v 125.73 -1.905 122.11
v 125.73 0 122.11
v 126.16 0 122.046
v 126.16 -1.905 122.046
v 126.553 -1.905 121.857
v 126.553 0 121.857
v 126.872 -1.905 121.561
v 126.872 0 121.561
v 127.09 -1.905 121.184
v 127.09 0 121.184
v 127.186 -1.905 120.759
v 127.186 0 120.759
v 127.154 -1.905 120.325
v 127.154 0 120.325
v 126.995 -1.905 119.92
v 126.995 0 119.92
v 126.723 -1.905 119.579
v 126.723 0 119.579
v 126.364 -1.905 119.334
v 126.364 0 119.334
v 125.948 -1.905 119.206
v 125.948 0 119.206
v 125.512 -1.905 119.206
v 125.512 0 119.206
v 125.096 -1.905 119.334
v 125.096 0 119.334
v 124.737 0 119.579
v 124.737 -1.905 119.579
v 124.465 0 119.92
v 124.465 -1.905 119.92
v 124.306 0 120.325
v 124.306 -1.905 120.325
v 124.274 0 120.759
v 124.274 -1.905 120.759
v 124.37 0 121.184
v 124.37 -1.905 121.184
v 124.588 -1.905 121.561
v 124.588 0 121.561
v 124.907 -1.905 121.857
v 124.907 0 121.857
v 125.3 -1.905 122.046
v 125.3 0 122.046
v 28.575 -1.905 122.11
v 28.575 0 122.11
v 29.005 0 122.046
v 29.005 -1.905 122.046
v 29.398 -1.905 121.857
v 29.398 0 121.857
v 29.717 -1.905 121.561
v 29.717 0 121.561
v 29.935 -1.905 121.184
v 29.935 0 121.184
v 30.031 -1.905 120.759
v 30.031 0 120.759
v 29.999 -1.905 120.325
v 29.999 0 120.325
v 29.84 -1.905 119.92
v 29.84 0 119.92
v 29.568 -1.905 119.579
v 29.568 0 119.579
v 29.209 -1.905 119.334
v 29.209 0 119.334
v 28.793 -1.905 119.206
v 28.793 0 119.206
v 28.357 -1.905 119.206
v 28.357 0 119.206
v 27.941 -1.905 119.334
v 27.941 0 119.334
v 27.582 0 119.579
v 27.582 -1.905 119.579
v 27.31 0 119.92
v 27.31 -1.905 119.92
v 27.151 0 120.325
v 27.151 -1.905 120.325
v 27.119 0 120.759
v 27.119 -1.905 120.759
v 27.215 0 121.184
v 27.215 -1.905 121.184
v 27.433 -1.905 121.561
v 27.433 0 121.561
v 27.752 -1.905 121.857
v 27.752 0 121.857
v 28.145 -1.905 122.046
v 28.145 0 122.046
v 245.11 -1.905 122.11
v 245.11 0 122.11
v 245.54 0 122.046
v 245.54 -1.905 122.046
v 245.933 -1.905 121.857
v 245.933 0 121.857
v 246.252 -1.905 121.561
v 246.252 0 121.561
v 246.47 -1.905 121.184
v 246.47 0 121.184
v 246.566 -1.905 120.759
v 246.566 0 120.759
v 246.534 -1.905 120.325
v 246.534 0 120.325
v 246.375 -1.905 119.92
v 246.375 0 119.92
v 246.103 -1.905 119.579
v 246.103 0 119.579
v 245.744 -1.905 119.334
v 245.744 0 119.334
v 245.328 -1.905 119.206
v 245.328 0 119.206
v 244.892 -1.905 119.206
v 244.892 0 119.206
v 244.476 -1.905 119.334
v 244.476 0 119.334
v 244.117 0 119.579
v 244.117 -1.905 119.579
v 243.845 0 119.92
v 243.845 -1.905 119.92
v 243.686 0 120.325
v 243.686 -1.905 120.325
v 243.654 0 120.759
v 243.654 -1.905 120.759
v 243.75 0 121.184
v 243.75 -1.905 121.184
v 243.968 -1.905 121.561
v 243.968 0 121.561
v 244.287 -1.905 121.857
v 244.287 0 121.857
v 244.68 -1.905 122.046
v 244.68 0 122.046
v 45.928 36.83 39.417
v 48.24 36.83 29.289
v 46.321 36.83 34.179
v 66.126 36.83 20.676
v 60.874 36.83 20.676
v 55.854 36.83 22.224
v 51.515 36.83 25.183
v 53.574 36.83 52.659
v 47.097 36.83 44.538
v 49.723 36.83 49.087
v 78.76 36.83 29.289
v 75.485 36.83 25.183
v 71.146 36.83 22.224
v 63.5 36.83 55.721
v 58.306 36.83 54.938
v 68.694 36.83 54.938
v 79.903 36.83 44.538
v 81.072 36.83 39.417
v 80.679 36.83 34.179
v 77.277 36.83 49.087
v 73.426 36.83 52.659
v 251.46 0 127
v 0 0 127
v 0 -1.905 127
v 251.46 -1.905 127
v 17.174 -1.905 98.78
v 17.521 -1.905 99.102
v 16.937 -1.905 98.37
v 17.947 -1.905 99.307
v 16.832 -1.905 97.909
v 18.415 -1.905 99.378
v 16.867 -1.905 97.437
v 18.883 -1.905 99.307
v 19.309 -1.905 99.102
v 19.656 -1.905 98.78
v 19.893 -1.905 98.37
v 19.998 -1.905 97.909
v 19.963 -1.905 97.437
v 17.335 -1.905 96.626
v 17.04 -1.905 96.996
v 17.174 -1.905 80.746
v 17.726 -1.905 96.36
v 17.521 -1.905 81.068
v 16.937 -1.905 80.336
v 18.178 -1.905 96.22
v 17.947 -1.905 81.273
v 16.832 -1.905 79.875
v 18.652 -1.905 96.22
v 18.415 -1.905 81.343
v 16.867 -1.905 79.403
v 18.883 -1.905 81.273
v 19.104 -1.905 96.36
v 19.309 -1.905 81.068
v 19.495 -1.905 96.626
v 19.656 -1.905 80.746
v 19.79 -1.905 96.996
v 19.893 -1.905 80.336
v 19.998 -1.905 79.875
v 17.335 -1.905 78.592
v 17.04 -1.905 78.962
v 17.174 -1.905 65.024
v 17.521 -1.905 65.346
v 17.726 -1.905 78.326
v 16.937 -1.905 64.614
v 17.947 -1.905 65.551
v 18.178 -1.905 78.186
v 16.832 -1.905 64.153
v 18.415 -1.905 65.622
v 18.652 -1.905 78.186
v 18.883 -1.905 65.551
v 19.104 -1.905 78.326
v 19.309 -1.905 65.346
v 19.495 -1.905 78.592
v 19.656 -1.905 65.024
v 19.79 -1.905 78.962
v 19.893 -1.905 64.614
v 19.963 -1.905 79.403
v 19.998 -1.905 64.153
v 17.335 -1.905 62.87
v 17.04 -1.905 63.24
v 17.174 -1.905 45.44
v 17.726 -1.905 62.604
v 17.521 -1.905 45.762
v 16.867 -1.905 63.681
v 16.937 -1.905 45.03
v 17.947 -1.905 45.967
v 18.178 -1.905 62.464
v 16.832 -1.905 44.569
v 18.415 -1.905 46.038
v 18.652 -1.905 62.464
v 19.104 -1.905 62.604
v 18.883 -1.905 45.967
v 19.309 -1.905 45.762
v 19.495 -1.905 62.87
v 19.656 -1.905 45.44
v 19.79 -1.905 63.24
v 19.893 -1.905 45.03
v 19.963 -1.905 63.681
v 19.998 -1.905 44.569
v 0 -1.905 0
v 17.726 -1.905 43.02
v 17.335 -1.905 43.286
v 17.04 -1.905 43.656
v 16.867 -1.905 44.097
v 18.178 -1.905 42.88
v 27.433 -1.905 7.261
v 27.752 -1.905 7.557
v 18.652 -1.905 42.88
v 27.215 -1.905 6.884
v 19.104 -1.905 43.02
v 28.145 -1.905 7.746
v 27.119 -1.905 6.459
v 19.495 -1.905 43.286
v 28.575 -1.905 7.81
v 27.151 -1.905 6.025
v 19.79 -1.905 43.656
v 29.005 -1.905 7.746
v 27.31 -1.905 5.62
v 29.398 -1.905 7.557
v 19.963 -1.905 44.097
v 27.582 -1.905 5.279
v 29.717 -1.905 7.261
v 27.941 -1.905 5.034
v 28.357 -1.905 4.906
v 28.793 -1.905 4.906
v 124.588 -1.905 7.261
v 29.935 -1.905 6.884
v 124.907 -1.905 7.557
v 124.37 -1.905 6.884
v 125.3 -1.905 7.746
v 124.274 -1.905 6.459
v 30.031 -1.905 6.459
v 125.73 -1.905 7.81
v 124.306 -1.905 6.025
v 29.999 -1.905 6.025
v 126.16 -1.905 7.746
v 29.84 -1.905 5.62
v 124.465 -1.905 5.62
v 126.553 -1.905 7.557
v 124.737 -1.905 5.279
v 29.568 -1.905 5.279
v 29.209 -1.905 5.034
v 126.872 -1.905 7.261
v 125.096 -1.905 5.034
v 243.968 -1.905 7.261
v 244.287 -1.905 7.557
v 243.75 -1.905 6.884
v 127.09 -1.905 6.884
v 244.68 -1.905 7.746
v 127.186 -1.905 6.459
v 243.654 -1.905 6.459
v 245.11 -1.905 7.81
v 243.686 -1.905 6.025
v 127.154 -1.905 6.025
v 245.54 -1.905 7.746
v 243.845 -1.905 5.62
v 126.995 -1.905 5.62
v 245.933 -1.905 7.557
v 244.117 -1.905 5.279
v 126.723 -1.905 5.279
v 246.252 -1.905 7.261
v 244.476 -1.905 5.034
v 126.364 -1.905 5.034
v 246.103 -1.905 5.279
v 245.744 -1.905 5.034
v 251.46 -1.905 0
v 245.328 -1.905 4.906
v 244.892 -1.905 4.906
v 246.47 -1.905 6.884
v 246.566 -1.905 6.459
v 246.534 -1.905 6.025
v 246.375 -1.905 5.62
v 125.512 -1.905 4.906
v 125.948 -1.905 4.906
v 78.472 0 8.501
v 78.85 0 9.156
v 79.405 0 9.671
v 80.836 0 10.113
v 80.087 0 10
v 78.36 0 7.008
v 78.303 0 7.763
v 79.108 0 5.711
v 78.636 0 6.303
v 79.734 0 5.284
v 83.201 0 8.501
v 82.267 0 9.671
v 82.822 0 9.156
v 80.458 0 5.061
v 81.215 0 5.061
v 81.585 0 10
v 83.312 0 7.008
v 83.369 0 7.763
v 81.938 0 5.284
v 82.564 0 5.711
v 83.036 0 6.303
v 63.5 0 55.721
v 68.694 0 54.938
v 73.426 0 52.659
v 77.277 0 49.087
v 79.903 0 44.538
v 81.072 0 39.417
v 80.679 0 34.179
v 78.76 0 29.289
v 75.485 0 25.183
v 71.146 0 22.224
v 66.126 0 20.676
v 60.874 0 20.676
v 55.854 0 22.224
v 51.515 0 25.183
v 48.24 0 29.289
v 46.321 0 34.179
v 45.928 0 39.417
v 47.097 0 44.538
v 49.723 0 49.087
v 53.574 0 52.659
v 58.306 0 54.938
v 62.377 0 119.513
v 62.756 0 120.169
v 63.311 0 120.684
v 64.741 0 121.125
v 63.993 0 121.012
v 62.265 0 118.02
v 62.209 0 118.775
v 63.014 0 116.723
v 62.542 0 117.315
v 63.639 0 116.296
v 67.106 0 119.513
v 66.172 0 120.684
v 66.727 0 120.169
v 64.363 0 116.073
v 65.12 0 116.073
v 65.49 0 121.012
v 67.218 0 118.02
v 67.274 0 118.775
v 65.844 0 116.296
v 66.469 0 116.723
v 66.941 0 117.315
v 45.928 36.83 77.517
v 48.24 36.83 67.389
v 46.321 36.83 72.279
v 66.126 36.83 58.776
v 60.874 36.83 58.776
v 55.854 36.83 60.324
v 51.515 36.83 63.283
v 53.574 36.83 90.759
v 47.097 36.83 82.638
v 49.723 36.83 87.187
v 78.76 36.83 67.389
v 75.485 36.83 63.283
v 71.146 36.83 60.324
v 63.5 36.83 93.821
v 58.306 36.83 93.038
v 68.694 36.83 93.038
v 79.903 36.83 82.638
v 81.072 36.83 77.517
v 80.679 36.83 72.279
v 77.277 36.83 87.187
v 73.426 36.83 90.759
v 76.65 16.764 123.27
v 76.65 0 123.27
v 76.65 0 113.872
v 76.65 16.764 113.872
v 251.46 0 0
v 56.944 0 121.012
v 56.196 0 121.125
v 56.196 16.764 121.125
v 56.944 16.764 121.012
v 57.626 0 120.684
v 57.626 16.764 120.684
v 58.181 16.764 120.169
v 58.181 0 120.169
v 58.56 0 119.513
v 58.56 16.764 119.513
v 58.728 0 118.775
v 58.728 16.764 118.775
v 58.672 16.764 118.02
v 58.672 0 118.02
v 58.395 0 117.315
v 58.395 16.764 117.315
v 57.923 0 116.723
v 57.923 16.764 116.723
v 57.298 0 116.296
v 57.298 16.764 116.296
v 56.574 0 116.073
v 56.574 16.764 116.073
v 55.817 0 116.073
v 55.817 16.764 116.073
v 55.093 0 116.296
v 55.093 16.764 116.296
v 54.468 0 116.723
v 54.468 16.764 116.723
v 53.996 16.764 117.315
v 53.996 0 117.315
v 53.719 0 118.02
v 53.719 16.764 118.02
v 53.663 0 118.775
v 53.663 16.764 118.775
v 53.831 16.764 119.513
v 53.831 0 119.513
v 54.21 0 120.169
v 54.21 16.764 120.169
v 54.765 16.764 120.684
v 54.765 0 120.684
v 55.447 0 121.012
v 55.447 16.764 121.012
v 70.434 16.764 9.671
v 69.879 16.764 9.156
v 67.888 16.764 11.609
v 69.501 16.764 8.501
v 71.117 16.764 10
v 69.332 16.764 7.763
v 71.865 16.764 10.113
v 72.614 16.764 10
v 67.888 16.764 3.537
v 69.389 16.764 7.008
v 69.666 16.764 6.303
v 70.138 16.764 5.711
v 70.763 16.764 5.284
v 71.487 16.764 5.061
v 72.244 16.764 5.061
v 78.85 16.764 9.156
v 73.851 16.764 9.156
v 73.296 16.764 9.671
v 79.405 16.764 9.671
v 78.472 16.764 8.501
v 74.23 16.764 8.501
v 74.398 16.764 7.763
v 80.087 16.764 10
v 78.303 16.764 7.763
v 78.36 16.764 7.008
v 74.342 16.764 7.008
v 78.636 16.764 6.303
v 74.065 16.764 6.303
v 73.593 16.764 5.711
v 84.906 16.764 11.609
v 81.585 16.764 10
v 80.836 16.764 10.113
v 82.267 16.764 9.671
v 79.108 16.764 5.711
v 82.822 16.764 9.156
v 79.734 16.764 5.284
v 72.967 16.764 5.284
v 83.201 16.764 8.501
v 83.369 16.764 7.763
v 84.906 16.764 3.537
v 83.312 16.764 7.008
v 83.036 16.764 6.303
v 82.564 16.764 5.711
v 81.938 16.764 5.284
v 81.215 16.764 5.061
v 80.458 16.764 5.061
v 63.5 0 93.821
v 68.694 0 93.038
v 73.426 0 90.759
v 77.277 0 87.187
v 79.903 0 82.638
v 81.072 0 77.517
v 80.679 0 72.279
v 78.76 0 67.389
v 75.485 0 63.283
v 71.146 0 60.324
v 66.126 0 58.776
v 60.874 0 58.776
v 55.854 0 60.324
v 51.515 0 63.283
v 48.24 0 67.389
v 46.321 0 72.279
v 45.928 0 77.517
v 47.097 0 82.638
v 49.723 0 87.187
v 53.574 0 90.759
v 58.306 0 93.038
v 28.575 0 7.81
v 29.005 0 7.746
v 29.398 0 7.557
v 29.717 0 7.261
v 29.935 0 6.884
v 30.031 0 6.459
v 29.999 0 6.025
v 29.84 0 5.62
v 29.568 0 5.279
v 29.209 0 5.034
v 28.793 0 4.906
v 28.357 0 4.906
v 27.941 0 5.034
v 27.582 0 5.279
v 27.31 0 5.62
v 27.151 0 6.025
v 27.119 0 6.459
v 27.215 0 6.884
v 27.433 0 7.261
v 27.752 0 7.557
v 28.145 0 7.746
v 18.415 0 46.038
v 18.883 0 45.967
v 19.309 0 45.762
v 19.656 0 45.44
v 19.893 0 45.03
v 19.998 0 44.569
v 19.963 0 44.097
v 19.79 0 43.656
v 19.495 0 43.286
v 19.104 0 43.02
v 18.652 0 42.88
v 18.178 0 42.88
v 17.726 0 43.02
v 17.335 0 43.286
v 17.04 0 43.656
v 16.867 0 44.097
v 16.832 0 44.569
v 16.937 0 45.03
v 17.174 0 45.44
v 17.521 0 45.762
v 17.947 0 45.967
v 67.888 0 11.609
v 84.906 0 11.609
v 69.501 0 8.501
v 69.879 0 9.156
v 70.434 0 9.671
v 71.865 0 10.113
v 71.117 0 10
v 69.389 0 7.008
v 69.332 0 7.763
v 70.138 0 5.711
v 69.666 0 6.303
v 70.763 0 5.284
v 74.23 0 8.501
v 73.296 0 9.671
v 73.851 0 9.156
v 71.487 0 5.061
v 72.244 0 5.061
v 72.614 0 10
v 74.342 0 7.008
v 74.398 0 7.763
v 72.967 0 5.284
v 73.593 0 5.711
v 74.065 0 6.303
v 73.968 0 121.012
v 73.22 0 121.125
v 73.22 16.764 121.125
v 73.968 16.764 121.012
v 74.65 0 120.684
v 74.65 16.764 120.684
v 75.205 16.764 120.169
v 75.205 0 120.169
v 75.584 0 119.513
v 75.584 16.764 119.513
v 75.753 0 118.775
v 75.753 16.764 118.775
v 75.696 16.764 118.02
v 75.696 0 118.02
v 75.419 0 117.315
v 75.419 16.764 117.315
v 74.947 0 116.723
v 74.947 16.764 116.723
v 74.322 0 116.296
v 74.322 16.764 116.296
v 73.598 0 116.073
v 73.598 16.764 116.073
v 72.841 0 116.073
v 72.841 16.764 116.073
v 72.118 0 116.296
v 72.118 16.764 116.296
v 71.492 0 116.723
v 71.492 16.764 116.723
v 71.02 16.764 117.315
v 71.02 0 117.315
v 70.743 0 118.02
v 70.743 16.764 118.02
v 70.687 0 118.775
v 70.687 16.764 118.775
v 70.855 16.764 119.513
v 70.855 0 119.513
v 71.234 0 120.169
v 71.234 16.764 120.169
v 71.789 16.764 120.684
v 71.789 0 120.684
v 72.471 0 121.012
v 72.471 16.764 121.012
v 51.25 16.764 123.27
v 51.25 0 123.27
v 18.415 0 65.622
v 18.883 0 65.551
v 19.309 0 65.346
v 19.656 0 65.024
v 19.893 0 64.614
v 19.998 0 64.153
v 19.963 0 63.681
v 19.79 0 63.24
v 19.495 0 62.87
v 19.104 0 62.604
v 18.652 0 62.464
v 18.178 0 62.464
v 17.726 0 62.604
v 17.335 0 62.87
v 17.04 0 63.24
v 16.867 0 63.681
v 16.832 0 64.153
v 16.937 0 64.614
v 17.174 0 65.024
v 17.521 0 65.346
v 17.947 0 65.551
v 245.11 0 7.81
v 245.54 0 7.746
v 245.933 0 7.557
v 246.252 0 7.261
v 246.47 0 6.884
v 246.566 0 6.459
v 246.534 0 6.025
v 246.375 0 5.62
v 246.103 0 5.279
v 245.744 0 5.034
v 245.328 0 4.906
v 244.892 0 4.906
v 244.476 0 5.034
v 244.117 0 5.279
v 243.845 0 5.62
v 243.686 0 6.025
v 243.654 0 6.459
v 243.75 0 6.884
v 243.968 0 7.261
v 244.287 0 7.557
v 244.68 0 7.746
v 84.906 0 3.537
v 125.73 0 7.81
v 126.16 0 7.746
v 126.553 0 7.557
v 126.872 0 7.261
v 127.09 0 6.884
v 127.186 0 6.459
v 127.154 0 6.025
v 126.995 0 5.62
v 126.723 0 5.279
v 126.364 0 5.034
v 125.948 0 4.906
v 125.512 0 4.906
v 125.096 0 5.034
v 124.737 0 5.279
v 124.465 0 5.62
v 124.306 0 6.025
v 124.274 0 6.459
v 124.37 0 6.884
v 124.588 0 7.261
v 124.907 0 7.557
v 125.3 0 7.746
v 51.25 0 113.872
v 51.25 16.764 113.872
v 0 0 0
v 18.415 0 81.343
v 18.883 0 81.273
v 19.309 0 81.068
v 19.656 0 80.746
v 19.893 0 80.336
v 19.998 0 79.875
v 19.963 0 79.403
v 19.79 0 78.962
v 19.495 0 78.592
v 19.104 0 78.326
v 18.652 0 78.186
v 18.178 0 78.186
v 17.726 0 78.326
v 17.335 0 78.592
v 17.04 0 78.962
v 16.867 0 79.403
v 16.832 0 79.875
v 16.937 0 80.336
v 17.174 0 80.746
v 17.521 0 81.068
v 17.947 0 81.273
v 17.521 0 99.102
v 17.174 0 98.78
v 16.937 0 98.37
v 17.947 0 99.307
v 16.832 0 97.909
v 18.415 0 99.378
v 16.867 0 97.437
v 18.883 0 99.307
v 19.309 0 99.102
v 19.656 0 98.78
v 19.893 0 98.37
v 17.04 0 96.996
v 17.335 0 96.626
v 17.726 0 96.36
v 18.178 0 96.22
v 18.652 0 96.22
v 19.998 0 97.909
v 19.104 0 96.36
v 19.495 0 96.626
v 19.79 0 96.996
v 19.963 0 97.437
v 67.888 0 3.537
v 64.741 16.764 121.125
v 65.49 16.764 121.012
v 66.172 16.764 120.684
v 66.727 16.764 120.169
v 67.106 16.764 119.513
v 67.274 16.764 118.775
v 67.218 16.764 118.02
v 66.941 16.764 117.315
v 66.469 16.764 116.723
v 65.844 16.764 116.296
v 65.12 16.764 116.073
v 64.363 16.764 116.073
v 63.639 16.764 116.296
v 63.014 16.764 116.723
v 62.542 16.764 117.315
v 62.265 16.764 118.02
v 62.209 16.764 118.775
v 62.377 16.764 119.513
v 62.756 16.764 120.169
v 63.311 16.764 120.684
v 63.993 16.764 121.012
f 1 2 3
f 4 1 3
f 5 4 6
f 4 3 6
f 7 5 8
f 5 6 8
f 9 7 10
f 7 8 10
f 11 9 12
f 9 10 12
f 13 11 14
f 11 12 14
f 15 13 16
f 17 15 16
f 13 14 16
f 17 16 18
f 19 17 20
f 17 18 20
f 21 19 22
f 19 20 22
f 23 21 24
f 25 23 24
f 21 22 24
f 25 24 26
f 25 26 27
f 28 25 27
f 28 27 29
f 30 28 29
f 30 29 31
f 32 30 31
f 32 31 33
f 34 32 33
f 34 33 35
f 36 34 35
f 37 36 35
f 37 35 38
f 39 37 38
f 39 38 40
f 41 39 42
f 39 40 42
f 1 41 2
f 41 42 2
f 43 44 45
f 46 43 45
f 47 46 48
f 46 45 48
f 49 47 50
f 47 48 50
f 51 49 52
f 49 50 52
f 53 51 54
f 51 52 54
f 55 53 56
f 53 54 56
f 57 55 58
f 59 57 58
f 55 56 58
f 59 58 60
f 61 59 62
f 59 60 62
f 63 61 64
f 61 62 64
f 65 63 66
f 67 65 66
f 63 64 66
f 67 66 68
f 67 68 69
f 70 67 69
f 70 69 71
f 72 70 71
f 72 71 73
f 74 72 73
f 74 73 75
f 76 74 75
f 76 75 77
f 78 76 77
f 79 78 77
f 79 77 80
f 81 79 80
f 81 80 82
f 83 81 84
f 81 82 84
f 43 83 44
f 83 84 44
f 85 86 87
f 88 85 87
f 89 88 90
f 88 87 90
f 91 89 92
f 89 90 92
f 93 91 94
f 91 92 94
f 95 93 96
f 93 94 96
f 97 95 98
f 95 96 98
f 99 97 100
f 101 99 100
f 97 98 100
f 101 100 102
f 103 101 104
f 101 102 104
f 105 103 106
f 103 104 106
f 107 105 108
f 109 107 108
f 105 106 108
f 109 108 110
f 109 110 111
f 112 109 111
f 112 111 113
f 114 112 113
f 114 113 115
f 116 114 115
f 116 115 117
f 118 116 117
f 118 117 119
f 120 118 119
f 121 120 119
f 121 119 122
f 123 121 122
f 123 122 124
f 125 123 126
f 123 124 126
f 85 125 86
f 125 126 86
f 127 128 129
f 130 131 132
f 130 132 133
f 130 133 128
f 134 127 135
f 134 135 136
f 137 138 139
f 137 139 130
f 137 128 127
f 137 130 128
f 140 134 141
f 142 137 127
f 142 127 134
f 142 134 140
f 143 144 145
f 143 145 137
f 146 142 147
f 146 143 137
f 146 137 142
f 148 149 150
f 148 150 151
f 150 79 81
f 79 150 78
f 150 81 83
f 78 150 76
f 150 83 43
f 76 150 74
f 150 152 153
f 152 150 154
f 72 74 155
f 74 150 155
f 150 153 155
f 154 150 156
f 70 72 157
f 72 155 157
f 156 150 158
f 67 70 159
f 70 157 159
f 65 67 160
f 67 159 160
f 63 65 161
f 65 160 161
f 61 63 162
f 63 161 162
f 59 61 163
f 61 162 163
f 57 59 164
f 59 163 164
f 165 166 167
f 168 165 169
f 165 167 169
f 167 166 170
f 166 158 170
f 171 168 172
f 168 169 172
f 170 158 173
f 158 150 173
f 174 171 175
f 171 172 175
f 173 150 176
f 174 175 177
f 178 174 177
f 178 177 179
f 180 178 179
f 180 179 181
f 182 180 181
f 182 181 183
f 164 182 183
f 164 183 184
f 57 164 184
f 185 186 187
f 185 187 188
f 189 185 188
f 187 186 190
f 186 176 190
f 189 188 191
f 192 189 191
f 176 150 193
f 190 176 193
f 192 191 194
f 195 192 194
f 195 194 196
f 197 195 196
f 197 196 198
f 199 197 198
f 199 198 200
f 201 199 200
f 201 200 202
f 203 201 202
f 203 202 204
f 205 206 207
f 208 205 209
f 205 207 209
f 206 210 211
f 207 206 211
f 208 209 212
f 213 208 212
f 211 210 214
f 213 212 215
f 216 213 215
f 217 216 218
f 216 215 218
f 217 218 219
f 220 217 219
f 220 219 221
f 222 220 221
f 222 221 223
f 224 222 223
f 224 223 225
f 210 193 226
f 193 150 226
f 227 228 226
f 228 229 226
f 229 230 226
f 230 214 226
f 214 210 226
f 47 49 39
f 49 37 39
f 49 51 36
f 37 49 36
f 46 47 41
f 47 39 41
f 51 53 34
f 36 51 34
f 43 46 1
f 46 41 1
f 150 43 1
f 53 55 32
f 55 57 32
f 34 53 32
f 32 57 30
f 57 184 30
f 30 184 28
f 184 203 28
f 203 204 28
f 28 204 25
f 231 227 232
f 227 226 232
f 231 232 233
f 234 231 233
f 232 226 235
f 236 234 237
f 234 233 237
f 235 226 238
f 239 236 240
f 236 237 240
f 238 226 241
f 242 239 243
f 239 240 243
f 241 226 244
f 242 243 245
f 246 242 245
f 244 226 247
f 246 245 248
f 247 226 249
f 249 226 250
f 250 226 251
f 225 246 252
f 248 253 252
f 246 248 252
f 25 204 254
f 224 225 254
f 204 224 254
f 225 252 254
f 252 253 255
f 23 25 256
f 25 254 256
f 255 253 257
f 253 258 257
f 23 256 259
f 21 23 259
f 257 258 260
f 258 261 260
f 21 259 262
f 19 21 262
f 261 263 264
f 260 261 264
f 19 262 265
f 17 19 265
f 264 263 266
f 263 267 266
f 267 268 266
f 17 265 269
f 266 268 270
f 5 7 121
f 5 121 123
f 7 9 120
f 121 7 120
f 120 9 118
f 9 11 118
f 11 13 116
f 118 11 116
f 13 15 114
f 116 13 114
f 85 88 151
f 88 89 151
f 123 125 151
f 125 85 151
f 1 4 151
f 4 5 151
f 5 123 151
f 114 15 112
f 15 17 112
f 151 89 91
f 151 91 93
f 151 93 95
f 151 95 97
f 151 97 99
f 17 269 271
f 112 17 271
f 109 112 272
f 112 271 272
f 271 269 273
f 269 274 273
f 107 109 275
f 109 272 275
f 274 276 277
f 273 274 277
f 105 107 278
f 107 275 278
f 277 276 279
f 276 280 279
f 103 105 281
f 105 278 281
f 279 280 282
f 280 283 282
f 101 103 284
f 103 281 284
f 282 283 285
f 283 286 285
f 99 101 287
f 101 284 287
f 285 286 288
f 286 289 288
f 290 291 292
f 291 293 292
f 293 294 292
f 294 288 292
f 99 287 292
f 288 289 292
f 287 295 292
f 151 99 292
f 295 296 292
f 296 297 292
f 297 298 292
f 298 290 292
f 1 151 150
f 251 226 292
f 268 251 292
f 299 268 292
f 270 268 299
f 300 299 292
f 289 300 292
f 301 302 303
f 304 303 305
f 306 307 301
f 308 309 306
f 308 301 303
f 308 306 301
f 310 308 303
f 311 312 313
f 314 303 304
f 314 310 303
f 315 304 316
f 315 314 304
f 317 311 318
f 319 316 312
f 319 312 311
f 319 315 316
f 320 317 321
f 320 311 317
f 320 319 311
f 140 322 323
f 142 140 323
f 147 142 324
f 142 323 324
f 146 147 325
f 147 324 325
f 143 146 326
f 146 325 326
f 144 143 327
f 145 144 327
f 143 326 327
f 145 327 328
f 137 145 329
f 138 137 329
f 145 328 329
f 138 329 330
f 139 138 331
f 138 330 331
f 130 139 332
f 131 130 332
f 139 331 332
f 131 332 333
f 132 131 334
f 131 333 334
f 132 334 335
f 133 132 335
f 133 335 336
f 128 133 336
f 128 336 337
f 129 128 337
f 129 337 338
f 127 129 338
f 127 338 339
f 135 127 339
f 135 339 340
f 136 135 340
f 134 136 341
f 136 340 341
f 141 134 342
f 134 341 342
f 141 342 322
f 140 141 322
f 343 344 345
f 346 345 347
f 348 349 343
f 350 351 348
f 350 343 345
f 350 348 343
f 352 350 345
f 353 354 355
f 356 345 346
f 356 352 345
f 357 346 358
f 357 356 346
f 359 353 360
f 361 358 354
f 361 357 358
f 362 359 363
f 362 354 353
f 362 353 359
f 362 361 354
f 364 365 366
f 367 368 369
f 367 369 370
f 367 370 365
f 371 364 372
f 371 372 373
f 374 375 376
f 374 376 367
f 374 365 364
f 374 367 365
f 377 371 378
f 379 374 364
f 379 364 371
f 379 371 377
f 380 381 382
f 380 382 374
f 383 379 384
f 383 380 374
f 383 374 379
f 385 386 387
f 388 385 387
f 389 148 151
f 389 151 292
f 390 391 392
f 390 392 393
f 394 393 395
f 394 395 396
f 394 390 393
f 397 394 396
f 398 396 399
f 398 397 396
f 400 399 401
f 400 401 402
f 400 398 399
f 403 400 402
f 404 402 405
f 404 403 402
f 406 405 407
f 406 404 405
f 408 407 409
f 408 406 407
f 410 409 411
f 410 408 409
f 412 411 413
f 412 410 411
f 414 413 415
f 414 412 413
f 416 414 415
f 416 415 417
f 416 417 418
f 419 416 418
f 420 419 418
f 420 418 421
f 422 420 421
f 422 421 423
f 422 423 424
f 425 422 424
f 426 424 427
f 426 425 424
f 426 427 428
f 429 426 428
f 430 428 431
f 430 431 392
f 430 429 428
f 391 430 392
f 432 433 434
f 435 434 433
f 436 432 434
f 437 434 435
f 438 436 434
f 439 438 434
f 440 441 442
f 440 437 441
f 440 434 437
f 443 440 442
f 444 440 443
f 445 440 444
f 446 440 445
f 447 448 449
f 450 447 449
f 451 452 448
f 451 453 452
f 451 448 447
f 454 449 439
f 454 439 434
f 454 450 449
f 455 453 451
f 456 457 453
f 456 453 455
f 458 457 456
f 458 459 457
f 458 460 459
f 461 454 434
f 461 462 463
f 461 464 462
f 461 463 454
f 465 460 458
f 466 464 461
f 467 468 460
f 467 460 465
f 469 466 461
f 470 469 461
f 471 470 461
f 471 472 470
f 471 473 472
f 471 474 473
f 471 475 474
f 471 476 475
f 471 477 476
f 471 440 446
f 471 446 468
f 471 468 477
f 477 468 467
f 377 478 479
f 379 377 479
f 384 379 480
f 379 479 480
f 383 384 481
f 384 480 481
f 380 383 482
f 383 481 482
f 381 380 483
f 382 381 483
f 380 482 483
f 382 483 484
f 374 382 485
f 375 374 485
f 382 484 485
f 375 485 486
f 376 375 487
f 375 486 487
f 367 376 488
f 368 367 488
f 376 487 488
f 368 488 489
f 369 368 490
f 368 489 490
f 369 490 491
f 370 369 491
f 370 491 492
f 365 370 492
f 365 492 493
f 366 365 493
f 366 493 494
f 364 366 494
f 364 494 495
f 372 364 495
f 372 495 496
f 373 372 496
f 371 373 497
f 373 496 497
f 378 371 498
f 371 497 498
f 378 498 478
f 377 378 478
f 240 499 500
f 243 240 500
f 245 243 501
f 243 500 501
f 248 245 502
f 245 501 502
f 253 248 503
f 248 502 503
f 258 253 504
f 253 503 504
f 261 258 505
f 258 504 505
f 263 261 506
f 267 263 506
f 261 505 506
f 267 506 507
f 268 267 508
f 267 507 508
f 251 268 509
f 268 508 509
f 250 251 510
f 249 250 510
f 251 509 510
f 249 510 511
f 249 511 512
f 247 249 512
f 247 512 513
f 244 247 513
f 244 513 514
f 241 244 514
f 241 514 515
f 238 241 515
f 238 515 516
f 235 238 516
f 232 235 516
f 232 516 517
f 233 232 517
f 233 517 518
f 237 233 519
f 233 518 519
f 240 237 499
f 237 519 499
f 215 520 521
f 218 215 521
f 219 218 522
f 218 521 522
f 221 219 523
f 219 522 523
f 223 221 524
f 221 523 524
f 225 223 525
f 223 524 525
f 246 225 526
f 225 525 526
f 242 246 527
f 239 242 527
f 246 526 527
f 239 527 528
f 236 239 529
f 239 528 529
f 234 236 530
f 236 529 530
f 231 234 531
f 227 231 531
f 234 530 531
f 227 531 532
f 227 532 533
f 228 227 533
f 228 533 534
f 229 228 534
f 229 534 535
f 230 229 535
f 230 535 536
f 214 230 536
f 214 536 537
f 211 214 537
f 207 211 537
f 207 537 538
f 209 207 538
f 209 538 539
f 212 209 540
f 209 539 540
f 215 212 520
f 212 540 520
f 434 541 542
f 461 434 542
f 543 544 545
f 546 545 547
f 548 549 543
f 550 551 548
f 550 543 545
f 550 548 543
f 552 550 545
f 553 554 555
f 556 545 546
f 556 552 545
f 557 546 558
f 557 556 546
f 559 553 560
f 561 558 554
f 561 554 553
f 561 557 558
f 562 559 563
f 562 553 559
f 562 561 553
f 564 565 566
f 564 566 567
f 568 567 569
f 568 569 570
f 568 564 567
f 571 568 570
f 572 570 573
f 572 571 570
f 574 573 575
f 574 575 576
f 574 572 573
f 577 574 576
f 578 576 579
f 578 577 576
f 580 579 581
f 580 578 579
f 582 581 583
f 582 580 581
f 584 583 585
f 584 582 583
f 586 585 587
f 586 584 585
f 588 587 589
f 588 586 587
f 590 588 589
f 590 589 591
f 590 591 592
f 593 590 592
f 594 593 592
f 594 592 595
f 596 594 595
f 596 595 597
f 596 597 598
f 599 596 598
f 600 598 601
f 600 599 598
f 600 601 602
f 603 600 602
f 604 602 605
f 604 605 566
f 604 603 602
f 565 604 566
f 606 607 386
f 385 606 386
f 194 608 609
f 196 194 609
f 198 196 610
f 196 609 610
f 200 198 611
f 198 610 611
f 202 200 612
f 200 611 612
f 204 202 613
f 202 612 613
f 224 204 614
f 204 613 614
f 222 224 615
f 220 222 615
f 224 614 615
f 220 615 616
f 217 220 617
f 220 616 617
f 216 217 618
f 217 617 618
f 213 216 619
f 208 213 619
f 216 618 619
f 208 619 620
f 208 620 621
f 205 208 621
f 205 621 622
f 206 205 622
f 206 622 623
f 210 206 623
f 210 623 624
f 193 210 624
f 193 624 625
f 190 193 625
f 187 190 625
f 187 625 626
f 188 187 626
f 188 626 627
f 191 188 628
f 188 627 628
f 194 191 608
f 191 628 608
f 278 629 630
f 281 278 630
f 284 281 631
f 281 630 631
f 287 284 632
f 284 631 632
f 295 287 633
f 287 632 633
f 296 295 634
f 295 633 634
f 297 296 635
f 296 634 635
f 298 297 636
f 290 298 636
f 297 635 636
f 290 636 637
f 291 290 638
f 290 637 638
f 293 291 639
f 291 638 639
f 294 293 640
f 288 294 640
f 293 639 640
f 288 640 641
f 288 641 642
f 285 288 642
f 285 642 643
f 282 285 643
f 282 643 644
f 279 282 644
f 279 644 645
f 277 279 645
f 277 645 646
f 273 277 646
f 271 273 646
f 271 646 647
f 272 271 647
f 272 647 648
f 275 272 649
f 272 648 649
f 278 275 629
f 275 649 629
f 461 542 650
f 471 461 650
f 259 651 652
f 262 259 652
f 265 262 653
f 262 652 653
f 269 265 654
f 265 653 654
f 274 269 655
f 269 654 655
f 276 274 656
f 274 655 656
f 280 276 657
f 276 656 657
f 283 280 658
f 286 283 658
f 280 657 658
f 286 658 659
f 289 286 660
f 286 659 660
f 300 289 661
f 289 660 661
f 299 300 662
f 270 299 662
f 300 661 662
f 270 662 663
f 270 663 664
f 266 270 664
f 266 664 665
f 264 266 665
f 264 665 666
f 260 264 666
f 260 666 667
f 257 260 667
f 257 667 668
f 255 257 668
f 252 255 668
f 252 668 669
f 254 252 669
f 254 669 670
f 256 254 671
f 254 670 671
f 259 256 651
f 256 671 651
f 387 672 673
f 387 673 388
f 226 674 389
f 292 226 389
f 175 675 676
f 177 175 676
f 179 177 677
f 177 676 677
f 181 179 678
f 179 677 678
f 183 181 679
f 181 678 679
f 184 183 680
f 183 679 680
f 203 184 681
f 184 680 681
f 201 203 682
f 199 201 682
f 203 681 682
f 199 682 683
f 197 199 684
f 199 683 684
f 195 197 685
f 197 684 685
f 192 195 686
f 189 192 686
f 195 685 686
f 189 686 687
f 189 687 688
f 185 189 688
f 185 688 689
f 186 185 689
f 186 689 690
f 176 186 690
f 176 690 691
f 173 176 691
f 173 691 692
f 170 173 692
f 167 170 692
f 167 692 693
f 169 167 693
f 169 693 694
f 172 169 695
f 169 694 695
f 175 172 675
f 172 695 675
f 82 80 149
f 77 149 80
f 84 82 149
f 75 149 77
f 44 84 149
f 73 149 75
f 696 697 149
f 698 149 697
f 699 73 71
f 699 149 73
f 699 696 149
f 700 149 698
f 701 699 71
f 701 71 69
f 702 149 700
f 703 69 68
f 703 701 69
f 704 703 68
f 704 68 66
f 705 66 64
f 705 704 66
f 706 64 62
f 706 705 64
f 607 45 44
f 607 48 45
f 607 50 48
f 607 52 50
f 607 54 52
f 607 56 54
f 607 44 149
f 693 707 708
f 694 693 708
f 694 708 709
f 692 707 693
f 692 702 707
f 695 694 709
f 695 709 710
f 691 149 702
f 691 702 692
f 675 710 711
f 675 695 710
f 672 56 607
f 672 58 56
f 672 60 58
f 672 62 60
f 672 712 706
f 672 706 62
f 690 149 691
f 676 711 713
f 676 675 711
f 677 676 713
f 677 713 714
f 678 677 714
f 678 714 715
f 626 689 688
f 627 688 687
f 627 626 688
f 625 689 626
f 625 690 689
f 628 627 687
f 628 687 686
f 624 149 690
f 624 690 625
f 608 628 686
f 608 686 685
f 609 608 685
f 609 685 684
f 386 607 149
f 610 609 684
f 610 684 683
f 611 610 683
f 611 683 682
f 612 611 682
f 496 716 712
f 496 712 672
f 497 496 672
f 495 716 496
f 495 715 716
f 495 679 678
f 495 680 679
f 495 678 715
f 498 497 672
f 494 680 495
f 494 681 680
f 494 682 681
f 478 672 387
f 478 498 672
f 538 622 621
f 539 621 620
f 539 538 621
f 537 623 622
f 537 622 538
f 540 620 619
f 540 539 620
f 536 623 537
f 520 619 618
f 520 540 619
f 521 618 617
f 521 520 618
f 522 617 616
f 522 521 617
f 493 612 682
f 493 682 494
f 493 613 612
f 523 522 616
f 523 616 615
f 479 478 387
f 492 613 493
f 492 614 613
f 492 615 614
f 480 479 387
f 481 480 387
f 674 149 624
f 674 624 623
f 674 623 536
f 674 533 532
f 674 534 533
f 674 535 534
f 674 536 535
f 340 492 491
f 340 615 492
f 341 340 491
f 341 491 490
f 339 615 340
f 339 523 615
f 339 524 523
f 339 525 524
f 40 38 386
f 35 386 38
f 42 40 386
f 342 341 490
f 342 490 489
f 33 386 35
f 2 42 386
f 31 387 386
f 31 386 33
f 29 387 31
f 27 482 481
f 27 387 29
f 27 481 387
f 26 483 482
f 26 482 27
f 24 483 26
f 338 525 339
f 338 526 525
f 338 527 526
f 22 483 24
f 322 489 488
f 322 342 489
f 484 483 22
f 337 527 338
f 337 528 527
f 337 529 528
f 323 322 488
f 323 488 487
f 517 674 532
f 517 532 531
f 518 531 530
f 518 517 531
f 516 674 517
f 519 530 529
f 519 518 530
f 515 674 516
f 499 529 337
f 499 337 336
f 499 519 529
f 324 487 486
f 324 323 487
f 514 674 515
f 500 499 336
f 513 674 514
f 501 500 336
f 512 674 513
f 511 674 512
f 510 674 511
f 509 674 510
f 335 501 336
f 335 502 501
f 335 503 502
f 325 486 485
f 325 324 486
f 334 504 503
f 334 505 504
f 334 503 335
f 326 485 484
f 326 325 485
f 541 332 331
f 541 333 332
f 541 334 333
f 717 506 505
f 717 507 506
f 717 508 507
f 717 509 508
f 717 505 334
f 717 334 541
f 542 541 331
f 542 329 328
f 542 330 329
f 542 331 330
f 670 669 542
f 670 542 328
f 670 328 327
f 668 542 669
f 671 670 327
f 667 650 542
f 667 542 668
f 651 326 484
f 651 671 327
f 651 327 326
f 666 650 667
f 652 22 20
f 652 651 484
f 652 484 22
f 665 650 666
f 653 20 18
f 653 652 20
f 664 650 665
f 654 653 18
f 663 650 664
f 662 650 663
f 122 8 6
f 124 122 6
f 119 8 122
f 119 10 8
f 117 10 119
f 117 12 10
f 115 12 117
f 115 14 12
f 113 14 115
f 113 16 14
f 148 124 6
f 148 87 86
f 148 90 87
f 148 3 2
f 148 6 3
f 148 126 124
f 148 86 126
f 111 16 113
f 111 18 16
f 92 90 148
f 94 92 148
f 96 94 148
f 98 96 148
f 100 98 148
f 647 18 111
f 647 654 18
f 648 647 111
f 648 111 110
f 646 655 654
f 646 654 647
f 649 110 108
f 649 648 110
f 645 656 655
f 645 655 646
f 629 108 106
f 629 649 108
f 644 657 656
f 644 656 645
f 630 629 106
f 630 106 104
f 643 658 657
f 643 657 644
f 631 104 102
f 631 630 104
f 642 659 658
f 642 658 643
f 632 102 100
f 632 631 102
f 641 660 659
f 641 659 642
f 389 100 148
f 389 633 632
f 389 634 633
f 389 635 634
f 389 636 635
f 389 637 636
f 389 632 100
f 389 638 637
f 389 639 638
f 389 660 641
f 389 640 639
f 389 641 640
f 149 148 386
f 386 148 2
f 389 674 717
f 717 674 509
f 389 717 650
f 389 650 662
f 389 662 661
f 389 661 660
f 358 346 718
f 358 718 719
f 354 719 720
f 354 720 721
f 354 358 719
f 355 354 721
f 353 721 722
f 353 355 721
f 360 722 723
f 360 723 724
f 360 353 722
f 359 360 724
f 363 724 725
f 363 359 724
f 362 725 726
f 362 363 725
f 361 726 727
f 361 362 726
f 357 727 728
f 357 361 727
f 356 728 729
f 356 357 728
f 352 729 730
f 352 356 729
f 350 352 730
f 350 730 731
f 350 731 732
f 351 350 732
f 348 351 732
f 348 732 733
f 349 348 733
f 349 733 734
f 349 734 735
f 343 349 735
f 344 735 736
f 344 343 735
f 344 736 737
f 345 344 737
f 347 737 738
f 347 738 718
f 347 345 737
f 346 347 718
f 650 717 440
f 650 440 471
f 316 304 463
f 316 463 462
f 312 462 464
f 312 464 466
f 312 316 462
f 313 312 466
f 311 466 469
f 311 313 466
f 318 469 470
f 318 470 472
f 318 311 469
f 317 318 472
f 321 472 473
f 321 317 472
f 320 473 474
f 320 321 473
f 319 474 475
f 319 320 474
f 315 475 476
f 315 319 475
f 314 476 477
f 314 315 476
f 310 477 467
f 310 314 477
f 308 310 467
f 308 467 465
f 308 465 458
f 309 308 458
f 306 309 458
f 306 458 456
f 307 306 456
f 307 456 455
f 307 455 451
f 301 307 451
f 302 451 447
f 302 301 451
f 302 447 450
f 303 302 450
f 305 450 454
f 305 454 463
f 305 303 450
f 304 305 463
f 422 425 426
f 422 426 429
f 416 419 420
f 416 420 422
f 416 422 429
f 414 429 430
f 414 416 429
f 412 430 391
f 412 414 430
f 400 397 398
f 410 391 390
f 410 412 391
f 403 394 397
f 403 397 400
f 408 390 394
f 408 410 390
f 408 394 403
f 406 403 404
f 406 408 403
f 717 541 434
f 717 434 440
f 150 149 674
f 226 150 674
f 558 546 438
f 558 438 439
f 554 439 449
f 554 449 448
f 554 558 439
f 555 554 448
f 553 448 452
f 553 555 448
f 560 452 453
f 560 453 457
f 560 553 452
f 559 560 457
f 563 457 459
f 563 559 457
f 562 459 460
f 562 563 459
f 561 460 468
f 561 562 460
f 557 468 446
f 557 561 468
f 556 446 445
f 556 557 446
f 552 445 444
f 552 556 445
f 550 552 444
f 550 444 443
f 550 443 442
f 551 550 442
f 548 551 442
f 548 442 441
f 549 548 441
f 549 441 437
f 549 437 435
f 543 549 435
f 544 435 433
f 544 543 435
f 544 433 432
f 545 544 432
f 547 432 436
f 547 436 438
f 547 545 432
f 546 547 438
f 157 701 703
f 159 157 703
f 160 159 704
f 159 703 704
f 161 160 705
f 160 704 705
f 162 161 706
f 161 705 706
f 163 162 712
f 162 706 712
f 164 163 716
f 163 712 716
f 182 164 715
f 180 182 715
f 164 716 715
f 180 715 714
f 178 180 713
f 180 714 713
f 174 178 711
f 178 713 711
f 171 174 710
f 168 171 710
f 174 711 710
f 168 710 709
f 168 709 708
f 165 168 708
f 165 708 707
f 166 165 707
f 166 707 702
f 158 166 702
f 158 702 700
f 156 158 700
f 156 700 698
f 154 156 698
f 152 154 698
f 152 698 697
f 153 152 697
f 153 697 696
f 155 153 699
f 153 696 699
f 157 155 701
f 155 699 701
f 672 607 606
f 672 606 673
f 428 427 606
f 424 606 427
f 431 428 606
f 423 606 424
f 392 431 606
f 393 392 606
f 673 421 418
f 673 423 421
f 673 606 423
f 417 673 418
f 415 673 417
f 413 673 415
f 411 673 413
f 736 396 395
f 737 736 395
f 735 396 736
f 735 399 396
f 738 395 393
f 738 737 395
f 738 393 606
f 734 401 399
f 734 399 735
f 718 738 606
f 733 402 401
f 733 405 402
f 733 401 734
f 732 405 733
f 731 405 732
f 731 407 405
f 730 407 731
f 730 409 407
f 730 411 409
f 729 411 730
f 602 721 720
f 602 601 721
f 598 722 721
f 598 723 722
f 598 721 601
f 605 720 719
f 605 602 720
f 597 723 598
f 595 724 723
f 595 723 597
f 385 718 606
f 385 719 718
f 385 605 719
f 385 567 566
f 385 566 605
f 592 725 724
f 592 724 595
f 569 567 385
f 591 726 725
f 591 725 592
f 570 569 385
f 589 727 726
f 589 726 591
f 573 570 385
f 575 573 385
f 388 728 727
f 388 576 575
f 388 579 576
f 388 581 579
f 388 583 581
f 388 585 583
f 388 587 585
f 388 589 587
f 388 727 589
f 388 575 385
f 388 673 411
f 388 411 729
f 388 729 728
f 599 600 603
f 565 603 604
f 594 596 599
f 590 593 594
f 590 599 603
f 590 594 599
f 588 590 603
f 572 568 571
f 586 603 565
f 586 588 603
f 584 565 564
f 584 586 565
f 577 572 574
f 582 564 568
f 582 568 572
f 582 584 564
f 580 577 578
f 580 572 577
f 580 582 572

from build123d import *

# Parameters (mm, degrees)
SKETCH1_W      = 251.46
SKETCH1_H      = 127
SKETCH1_R      = 1.4605
SKETCH1_R_2    = 1.5875
EXTRUDE1_DEPTH = 1.905
SKETCH2_R      = 17.62125
EXTRUDE2_DEPTH = 36.83
SKETCH3_W      = 25.4
SKETCH3_H      = 9.398
SKETCH3_R      = 2.54
SKETCH3_W_2    = 17.018
SKETCH3_H_2    = 8.0717042
EXTRUDE3_DEPTH = 16.764


with BuildPart() as part:
    # Sketch1 → Extrude1 (new body)
    with BuildSketch(Plane(origin=(0, 0, 0), x_dir=(1, 0, 0), z_dir=(0, 1, 0))):
        with Locations((125.73, -63.5)):
            Rectangle(SKETCH1_W, SKETCH1_H)
        with Locations(Location((28.575, -120.65, 0), (0, 0, 270))):
            Circle(SKETCH1_R, mode=Mode.SUBTRACT)
        with Locations(Location((28.575, -6.35, 0), (0, 0, 270))):
            Circle(SKETCH1_R, mode=Mode.SUBTRACT)
        with Locations(Location((245.11, -6.35, 0), (0, 0, 270))):
            Circle(SKETCH1_R, mode=Mode.SUBTRACT)
        with Locations(Location((245.11, -120.65, 0), (0, 0, 270))):
            Circle(SKETCH1_R, mode=Mode.SUBTRACT)
        with Locations(Location((125.73, -6.35, 0), (0, 0, 270))):
            Circle(SKETCH1_R, mode=Mode.SUBTRACT)
        with Locations(Location((125.73, -120.65, 0), (0, 0, 270))):
            Circle(SKETCH1_R, mode=Mode.SUBTRACT)
        with Locations(Location((18.415, -44.45, 0), (0, 0, 270))):
            Circle(SKETCH1_R_2, mode=Mode.SUBTRACT)
        with Locations(Location((18.415, -79.755956549, 0), (0, 0, 270))):
            Circle(SKETCH1_R_2, mode=Mode.SUBTRACT)
        with Locations(Location((18.415, -64.034066138, 0), (0, 0, 270))):
            Circle(SKETCH1_R_2, mode=Mode.SUBTRACT)
        with Locations(Location((18.415, -97.79, 0), (0, 0, 270))):
            Circle(SKETCH1_R_2, mode=Mode.SUBTRACT)
    extrude(amount=-EXTRUDE1_DEPTH)

    # Sketch2 → Extrude2 (add)
    with BuildSketch(Plane(origin=(0, 0, 0), x_dir=(1, 0, 0), z_dir=(0, 1, 0))):
        with Locations(Location((63.5, -76.2, 0), (0, 0, 270))):
            Circle(SKETCH2_R)
        with Locations(Location((63.5, -38.1, 0), (0, 0, 270))):
            Circle(SKETCH2_R)
    extrude(amount=EXTRUDE2_DEPTH)

    # Sketch3 → Extrude3 (add)
    # profile 1 of 2: a face of its own
    with BuildSketch(Plane(origin=(0, 0, 0), x_dir=(1, 0, 0), z_dir=(0, 1, 0))):
        with Locations((63.950056038, -118.57149124)):
            Rectangle(SKETCH3_W, SKETCH3_H)
        with Locations(Location((56.195547634, -118.584869875, 0), (0, 0, 270))):
            Circle(SKETCH3_R, mode=Mode.SUBTRACT)
        with Locations(Location((64.741474732, -118.584869875, 0), (0, 0, 270))):
            Circle(SKETCH3_R, mode=Mode.SUBTRACT)
        with Locations(Location((73.219619493, -118.584869875, 0), (0, 0, 270))):
            Circle(SKETCH3_R, mode=Mode.SUBTRACT)
    # profile 2 of 2: a face of its own
    with BuildSketch(Plane(origin=(0, 0, 0), x_dir=(1, 0, 0), z_dir=(0, 1, 0))):
        with Locations((76.396506794, -7.572762817)):
            Rectangle(SKETCH3_W_2, SKETCH3_H_2)
        with Locations(Location((71.865279643, -7.572762817, 0), (0, 0, 270))):
            Circle(SKETCH3_R, mode=Mode.SUBTRACT)
        with Locations(Location((80.836132406, -7.572762817, 0), (0, 0, 270))):
            Circle(SKETCH3_R, mode=Mode.SUBTRACT)
    extrude(amount=EXTRUDE3_DEPTH)


solid = part.part
